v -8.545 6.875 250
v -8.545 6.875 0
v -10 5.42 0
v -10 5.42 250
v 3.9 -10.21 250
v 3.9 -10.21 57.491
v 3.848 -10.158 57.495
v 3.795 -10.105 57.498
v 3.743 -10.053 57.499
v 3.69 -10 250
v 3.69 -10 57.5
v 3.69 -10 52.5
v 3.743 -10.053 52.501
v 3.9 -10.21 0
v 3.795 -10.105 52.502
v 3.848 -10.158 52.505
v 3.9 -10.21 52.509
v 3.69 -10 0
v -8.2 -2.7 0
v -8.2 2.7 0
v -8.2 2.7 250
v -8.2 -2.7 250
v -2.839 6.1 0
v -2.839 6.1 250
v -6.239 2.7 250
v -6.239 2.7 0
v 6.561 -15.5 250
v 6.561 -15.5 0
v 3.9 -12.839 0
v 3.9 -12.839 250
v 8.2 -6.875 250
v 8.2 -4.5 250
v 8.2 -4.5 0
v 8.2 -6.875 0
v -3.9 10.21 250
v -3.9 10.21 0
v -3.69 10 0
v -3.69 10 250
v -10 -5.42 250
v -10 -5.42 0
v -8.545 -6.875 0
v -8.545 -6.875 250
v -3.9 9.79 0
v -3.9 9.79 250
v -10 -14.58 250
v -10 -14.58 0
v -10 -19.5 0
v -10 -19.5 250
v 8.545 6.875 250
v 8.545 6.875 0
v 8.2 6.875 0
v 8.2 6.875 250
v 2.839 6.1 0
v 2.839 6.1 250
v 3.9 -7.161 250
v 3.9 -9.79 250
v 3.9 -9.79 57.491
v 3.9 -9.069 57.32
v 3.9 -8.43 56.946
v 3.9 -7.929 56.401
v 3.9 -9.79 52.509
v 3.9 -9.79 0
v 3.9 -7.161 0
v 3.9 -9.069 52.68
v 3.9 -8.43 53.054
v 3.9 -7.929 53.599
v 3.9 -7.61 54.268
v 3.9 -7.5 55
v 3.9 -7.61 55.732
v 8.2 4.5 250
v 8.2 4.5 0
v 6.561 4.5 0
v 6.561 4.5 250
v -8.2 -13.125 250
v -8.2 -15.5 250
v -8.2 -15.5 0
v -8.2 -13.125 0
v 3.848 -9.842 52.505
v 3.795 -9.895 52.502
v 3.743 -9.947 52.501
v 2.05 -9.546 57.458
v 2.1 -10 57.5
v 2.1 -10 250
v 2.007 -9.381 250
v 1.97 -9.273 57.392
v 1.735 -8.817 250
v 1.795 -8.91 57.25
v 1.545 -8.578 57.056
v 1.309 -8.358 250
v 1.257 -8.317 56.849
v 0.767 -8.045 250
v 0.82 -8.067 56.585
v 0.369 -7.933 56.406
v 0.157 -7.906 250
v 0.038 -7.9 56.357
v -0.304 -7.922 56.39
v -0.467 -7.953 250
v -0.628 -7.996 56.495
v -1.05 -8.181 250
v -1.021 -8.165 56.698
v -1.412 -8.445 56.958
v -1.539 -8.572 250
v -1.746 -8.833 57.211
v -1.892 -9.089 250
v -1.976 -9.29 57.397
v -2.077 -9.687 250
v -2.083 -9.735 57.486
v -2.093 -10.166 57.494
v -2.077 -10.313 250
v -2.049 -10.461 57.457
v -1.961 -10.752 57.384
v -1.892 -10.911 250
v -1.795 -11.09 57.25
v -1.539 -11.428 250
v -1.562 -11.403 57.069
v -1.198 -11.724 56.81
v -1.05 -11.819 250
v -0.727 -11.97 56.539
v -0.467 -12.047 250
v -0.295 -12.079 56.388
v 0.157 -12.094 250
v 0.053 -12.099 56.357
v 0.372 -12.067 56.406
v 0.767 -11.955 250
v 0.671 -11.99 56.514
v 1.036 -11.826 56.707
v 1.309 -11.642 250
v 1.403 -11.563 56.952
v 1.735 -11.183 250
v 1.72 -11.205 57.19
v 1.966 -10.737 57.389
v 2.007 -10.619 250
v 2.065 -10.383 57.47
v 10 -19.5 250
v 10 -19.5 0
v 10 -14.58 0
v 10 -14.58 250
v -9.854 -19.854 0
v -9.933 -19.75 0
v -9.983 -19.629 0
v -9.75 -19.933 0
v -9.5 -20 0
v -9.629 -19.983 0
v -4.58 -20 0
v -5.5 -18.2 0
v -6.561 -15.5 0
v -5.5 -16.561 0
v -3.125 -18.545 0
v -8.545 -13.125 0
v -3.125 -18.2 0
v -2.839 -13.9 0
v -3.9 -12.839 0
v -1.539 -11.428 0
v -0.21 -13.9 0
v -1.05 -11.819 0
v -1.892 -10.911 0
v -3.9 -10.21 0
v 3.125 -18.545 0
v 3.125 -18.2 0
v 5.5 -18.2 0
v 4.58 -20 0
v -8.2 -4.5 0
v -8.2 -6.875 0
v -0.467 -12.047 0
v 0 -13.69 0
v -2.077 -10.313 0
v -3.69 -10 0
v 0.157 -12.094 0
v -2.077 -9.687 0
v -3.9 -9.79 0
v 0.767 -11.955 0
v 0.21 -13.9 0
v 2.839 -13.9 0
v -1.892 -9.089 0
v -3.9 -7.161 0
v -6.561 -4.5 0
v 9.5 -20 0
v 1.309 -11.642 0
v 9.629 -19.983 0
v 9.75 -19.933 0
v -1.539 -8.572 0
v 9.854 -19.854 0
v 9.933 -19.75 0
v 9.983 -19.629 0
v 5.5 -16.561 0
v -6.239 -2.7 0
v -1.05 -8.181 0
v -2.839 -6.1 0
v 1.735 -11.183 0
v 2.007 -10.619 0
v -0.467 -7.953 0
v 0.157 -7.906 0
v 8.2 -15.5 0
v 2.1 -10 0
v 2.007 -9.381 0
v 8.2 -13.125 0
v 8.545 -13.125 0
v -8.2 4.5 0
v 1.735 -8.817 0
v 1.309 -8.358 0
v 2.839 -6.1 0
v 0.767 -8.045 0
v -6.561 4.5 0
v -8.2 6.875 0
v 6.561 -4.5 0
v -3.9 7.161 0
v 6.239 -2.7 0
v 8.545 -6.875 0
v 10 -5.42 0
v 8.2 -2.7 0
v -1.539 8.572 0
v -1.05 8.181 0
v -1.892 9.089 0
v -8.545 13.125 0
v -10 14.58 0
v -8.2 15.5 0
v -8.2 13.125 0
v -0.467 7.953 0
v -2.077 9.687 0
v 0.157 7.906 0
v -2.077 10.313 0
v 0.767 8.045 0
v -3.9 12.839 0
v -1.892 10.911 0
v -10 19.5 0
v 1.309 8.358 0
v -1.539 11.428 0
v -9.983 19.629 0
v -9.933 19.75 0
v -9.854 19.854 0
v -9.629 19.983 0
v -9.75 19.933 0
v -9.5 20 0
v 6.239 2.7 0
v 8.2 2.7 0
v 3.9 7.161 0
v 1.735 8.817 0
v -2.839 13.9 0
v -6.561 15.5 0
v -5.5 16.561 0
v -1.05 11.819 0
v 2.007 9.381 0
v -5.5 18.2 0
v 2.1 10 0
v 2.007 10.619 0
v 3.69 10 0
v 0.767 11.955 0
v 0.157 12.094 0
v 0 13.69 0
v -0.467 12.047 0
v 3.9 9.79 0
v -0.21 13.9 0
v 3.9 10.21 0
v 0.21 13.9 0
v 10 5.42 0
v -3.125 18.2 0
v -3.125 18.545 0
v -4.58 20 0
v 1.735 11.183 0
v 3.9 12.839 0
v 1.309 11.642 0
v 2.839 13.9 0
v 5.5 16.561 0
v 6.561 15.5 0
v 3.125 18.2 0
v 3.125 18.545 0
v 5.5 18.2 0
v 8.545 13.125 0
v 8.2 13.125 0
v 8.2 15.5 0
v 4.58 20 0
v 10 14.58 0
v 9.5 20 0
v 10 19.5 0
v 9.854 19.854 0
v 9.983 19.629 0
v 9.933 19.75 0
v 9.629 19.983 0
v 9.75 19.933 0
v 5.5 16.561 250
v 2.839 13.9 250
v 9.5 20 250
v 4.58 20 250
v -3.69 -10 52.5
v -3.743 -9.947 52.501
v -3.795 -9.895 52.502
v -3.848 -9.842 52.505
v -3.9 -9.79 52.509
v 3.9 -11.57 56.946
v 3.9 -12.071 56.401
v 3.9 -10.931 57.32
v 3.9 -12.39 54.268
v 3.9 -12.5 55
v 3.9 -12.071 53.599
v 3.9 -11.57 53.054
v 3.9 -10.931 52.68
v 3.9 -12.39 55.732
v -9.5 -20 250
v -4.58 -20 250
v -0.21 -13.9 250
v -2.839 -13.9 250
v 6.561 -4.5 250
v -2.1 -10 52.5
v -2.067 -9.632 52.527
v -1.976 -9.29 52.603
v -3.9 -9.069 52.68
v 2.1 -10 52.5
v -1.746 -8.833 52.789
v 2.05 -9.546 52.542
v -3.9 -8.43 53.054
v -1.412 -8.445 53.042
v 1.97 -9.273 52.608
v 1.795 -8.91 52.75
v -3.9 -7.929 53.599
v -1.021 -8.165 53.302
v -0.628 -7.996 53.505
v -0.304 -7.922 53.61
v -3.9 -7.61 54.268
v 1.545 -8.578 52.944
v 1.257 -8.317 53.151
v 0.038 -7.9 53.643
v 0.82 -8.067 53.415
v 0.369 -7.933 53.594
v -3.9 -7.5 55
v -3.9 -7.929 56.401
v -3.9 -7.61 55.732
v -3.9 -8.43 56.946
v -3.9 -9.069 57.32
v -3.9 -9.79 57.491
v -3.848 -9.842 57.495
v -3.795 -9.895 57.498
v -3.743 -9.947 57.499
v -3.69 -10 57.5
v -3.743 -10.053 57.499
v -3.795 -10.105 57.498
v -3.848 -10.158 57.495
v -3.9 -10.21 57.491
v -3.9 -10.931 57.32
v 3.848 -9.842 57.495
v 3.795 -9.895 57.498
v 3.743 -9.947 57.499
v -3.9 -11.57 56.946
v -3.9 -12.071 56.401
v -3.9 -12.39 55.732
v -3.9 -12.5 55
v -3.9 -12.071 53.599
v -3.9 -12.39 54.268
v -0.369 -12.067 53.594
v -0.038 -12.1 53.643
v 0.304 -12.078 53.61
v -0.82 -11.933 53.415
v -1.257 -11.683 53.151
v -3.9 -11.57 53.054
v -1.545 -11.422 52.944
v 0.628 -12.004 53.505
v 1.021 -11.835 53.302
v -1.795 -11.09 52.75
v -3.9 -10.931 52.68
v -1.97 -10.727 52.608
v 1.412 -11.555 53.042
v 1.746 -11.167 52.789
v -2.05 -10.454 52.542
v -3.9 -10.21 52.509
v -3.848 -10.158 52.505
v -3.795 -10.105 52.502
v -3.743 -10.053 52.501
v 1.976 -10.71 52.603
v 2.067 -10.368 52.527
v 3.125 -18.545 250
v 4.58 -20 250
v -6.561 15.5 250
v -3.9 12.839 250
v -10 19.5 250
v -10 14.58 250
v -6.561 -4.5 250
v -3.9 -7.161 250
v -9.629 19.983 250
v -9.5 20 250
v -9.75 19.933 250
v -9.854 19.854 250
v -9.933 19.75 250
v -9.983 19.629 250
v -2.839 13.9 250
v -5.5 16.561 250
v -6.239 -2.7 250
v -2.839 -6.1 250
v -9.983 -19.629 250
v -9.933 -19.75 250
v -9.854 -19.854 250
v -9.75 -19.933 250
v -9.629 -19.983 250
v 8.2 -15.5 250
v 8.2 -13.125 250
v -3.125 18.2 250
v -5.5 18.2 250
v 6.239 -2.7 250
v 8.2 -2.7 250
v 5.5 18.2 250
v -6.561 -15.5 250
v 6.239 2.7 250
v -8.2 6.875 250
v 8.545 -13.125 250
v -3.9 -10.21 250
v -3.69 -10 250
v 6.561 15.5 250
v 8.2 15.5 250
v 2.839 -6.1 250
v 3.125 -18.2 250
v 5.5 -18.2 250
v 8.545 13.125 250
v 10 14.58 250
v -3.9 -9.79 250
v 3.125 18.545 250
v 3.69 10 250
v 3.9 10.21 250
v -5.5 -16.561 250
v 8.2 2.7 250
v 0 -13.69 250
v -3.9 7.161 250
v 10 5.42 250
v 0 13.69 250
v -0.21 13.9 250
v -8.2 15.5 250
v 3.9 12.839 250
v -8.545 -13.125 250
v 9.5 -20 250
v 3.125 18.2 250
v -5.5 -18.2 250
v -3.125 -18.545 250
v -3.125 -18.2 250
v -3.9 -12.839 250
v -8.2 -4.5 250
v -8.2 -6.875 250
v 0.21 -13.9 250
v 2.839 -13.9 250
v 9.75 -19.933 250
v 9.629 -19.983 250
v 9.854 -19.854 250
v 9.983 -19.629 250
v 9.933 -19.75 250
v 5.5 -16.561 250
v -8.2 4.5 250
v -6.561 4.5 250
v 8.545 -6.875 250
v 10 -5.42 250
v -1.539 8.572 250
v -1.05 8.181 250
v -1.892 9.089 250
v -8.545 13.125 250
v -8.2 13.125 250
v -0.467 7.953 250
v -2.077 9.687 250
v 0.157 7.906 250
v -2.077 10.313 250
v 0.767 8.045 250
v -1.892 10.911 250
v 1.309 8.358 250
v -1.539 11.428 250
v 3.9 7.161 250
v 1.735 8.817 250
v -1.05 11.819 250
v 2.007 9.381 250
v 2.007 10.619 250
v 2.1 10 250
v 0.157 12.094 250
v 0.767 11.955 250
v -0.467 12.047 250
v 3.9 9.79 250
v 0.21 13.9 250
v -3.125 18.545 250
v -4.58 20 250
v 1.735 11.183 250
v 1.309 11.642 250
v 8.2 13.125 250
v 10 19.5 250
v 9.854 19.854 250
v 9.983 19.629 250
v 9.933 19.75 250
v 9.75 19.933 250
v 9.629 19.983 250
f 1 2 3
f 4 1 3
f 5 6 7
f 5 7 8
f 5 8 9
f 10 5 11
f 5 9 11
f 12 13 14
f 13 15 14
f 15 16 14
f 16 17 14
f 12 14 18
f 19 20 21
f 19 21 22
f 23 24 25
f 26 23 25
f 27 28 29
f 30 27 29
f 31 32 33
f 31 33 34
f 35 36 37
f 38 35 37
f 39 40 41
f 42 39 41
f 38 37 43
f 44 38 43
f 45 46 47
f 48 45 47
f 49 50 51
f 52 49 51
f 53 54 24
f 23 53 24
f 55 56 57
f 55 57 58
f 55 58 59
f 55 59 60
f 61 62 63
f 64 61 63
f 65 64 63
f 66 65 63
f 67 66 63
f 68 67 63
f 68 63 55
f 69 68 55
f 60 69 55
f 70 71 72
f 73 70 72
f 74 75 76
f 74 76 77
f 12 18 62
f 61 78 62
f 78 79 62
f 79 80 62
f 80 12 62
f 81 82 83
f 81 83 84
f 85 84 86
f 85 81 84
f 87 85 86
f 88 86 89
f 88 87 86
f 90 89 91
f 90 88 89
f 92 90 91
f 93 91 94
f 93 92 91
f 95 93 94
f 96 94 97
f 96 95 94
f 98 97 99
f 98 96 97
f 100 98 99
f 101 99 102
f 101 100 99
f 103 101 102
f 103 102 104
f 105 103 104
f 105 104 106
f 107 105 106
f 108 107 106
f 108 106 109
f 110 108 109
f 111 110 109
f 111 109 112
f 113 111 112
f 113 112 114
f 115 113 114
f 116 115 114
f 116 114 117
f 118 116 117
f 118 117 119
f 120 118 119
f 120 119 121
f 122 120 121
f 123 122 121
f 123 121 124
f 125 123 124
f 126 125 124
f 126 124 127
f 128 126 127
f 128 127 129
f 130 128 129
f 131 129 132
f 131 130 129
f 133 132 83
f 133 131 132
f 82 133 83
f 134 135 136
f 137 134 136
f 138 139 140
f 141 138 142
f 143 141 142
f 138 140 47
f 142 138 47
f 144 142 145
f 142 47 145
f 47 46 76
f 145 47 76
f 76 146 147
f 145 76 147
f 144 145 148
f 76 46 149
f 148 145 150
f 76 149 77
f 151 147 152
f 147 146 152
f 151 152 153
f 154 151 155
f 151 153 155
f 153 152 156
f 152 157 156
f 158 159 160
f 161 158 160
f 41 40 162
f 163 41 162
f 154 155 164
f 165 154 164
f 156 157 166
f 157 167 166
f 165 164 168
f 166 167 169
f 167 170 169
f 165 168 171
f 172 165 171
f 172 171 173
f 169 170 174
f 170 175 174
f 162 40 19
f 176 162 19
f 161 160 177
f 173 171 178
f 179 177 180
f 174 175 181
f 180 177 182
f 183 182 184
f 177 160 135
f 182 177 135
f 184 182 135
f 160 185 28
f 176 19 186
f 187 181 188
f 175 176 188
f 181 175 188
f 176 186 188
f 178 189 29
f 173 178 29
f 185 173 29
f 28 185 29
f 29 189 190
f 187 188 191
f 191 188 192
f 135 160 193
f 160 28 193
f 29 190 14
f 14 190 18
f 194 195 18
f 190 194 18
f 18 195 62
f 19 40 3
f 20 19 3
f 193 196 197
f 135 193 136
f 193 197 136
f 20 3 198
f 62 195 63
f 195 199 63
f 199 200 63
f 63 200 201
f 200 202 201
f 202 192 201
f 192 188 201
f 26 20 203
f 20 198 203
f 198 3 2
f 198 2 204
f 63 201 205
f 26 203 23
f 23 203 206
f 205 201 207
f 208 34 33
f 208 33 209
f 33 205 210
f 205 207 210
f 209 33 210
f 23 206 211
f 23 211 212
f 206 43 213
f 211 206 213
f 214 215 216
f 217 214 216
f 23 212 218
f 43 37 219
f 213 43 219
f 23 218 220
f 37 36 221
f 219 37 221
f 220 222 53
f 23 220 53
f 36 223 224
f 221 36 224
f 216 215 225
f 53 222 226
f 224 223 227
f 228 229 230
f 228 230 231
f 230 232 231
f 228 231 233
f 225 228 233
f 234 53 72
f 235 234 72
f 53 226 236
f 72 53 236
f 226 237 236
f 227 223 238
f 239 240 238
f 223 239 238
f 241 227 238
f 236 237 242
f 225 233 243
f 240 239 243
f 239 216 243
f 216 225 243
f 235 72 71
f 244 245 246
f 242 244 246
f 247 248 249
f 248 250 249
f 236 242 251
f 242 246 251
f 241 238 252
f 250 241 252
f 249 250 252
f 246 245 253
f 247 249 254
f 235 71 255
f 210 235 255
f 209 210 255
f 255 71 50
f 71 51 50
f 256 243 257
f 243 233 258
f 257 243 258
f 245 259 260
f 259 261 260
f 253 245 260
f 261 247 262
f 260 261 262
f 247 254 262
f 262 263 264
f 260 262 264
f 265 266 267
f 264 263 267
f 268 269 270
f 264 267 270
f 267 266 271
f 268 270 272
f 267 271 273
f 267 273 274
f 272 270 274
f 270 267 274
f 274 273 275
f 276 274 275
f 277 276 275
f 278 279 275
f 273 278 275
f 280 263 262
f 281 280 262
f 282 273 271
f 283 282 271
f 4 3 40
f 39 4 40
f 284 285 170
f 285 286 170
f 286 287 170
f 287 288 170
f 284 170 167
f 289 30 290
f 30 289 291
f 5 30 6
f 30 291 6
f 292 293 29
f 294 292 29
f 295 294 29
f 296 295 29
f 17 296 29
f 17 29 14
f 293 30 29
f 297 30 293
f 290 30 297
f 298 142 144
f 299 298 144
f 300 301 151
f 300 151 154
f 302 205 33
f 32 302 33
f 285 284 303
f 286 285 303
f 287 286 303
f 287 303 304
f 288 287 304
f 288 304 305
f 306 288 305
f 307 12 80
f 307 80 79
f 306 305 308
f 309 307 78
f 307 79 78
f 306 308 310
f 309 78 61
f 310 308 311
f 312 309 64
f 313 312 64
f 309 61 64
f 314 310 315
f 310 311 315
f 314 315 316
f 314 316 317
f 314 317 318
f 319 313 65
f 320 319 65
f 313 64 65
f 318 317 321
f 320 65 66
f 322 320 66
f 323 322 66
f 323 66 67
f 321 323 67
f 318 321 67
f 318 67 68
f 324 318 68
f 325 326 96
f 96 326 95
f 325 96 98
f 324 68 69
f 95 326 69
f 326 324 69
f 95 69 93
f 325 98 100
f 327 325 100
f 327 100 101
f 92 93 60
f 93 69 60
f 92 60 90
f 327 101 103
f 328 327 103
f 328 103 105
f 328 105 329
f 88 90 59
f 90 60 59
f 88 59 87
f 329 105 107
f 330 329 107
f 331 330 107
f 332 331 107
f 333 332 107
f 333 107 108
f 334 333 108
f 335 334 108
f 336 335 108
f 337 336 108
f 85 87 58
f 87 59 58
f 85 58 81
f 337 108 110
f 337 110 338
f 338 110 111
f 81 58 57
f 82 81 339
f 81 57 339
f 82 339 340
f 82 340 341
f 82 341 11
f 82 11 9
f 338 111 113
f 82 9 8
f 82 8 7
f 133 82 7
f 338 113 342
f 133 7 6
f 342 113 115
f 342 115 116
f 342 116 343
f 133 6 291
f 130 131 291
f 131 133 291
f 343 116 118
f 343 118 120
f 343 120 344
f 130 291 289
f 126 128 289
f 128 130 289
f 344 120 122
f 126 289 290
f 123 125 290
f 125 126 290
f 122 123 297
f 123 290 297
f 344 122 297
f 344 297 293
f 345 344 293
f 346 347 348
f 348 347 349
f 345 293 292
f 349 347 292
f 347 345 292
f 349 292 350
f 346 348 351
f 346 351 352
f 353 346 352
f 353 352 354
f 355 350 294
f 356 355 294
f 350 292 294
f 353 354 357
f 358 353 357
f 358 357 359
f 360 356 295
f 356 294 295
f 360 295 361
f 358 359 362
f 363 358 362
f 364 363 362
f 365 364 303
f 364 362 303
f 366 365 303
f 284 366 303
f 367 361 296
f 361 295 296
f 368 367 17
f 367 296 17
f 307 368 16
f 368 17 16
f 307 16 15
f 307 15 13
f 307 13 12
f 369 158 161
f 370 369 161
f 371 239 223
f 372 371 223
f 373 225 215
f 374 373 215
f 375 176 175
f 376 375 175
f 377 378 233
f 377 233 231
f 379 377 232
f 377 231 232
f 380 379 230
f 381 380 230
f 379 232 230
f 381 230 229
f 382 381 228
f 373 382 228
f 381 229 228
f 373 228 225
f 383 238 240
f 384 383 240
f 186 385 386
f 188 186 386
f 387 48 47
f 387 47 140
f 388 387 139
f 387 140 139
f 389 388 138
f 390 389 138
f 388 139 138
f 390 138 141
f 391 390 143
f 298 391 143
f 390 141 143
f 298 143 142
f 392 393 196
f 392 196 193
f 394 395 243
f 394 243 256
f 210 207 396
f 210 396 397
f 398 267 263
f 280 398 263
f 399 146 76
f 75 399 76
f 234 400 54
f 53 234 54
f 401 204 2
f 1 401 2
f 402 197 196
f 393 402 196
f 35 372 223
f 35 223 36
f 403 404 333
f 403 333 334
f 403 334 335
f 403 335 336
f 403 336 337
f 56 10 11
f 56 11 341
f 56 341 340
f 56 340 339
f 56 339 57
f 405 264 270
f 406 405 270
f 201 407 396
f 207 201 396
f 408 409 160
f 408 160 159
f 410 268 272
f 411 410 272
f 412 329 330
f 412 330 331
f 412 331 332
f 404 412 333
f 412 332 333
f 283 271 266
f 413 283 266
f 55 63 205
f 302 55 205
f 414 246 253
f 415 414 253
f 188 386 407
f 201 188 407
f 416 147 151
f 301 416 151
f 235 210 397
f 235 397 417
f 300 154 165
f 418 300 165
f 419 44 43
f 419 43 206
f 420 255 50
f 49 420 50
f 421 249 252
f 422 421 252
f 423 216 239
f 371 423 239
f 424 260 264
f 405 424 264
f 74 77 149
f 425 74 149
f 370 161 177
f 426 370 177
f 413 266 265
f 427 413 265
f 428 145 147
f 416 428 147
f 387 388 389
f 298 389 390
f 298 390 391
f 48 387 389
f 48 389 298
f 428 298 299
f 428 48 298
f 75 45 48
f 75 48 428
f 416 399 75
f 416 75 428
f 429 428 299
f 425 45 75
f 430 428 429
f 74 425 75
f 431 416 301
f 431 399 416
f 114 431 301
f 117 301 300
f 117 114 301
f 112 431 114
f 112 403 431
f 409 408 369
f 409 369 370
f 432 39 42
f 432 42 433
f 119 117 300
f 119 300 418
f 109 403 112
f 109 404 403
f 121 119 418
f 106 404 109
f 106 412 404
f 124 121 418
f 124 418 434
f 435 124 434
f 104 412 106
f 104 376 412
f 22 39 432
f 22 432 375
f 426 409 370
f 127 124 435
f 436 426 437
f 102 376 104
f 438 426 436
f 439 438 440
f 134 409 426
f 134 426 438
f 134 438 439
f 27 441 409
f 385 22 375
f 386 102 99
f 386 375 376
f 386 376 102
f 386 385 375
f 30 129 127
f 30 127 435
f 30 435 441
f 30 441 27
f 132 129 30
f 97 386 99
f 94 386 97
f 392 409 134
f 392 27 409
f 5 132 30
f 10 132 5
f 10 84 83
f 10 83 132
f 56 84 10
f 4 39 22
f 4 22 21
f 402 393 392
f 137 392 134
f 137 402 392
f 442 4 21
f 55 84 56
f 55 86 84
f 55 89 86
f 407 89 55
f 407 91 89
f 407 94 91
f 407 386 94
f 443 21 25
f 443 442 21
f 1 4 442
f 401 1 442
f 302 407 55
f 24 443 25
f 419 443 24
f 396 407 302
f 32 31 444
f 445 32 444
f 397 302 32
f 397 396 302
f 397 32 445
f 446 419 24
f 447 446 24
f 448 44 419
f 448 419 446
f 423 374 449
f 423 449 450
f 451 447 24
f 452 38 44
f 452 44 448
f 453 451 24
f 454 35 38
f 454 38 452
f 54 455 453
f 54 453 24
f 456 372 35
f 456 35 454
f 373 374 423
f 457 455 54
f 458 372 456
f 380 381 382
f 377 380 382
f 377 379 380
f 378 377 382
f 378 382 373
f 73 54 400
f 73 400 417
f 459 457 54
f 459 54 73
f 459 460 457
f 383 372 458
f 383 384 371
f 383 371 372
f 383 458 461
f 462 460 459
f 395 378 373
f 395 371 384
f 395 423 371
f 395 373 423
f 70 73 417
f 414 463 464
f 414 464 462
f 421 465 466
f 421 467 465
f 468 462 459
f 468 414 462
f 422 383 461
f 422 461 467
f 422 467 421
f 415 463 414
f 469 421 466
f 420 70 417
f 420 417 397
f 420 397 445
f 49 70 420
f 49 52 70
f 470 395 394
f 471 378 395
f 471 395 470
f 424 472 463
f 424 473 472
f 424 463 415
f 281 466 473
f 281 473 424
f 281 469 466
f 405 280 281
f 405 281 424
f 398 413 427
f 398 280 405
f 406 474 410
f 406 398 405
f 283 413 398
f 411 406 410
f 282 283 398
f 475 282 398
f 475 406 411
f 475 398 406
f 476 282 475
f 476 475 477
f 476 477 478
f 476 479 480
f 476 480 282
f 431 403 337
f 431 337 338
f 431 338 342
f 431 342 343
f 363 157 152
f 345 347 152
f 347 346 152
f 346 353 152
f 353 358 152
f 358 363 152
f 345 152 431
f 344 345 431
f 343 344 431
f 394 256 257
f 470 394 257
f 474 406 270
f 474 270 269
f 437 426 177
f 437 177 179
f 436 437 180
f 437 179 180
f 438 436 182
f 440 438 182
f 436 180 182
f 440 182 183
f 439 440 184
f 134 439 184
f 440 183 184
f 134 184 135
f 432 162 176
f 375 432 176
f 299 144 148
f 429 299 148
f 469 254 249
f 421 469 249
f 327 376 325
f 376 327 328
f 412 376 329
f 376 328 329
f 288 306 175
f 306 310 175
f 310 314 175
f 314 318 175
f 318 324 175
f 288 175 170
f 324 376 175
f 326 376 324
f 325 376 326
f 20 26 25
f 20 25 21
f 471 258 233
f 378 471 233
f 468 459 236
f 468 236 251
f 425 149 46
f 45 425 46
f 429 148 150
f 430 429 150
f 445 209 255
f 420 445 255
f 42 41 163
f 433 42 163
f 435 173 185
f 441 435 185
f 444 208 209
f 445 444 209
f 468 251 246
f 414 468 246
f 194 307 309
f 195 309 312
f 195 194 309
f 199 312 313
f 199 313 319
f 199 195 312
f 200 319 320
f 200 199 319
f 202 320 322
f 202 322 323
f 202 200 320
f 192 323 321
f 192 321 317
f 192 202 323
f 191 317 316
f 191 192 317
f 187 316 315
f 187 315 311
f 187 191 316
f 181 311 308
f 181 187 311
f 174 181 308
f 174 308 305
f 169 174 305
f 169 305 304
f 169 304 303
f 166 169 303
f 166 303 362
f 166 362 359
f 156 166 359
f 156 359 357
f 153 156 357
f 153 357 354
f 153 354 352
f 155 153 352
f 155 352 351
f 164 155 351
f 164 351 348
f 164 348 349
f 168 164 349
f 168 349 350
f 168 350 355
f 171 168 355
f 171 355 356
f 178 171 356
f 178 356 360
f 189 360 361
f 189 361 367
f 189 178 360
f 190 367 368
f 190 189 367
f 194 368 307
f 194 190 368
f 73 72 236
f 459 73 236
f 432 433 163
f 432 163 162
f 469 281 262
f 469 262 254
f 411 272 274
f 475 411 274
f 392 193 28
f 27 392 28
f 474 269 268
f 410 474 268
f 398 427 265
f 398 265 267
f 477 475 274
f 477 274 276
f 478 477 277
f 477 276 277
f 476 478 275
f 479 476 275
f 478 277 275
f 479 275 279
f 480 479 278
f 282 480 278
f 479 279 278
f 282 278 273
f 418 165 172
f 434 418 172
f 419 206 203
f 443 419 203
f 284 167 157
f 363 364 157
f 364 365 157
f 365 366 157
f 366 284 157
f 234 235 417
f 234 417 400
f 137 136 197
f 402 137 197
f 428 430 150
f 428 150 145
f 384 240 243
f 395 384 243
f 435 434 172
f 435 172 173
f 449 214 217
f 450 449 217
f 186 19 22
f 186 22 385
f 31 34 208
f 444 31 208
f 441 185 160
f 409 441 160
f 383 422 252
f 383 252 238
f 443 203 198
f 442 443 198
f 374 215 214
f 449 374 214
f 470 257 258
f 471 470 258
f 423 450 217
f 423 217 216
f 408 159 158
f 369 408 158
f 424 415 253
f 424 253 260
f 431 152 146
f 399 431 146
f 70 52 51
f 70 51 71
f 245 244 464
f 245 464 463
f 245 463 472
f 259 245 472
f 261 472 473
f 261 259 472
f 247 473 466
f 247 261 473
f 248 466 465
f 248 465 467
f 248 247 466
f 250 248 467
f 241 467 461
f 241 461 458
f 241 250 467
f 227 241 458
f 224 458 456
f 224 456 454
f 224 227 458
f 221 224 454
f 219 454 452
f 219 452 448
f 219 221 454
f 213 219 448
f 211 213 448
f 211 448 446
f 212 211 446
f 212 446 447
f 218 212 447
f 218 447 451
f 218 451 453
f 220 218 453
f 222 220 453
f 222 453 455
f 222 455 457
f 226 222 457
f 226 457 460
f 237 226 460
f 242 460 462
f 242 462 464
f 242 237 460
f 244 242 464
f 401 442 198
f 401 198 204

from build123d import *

# Parameters (mm, degrees)
ESBO_O1_R                = 2.1
RESSALTO_EXTRUS_O1_DEPTH = 250
CORTE_EXTRUS_O1_REACH    = 253.595
ESBO_O2_R                = 2.5


with BuildPart() as part:
    # Esboço1 → Ressalto-extrusão1 (new body)
    with BuildSketch(Plane.XY):
        with BuildLine():
            Line((3.9, 9.79), (3.69, 10))
            Line((3.69, 10), (3.9, 10.21))
            Line((3.9, 10.21), (3.9, 12.839339828))
            Line((3.9, 12.839339828), (6.560660172, 15.5))
            Line((6.560660172, 15.5), (8.2, 15.5))
            Line((8.2, 15.5), (8.2, 13.125))
            Line((8.2, 13.125), (8.545, 13.125))
            Line((8.545, 13.125), (10, 14.58))
            Line((10, 14.58), (10, 19.5))
            ThreePointArc((10, 19.5), (9.853553391, 19.853553391), (9.5, 20))
            Line((9.5, 20), (4.58, 20))
            Line((4.58, 20), (3.125, 18.545))
            Line((3.125, 18.545), (3.125, 18.2))
            Line((3.125, 18.2), (5.5, 18.2))
            Line((5.5, 18.2), (5.5, 16.560660172))
            Line((5.5, 16.560660172), (2.839339828, 13.9))
            Line((2.839339828, 13.9), (0.21, 13.9))
            Line((0.21, 13.9), (0, 13.69))
            Line((0, 13.69), (-0.21, 13.9))
            Line((-0.21, 13.9), (-2.839339828, 13.9))
            Line((-2.839339828, 13.9), (-5.5, 16.560660172))
            Line((-5.5, 16.560660172), (-5.5, 18.2))
            Line((-5.5, 18.2), (-3.125, 18.2))
            Line((-3.125, 18.2), (-3.125, 18.545))
            Line((-3.125, 18.545), (-4.58, 20))
            Line((-4.58, 20), (-9.5, 20))
            ThreePointArc((-9.5, 20), (-9.853553391, 19.853553391), (-10, 19.5))
            Line((-10, 19.5), (-10, 14.58))
            Line((-10, 14.58), (-8.545, 13.125))
            Line((-8.545, 13.125), (-8.2, 13.125))
            Line((-8.2, 13.125), (-8.2, 15.5))
            Line((-8.2, 15.5), (-6.560660172, 15.5))
            Line((-6.560660172, 15.5), (-3.9, 12.839339828))
            Line((-3.9, 12.839339828), (-3.9, 10.21))
            Line((-3.9, 10.21), (-3.69, 10))
            Line((-3.69, 10), (-3.9, 9.79))
            Line((-3.9, 9.79), (-3.9, 7.160660172))
            Line((-3.9, 7.160660172), (-6.560660172, 4.5))
            Line((-6.560660172, 4.5), (-8.2, 4.5))
            Line((-8.2, 4.5), (-8.2, 6.875))
            Line((-8.2, 6.875), (-8.545, 6.875))
            Line((-8.545, 6.875), (-10, 5.42))
            Line((-10, 5.42), (-10, -5.42))
            Line((-10, -5.42), (-8.545, -6.875))
            Line((-8.545, -6.875), (-8.2, -6.875))
            Line((-8.2, -6.875), (-8.2, -4.5))
            Line((-8.2, -4.5), (-6.560660172, -4.5))
            Line((-6.560660172, -4.5), (-3.9, -7.160660172))
            Line((-3.9, -7.160660172), (-3.9, -9.79))
            Line((-3.9, -9.79), (-3.69, -10))
            Line((-3.69, -10), (-3.9, -10.21))
            Line((-3.9, -10.21), (-3.9, -12.839339828))
            Line((-3.9, -12.839339828), (-6.560660172, -15.5))
            Line((-6.560660172, -15.5), (-8.2, -15.5))
            Line((-8.2, -15.5), (-8.2, -13.125))
            Line((-8.2, -13.125), (-8.545, -13.125))
            Line((-8.545, -13.125), (-10, -14.58))
            Line((-10, -14.58), (-10, -19.5))
            ThreePointArc((-10, -19.5), (-9.853553391, -19.853553391), (-9.5, -20))
            Line((-9.5, -20), (-4.58, -20))
            Line((-4.58, -20), (-3.125, -18.545))
            Line((-3.125, -18.545), (-3.125, -18.2))
            Line((-3.125, -18.2), (-5.5, -18.2))
            Line((-5.5, -18.2), (-5.5, -16.560660172))
            Line((-5.5, -16.560660172), (-2.839339828, -13.9))
            Line((-2.839339828, -13.9), (-0.21, -13.9))
            Line((-0.21, -13.9), (0, -13.69))
            Line((0, -13.69), (0.21, -13.9))
            Line((0.21, -13.9), (2.839339828, -13.9))
            Line((2.839339828, -13.9), (5.5, -16.560660172))
            Line((5.5, -16.560660172), (5.5, -18.2))
            Line((5.5, -18.2), (3.125, -18.2))
            Line((3.125, -18.2), (3.125, -18.545))
            Line((3.125, -18.545), (4.58, -20))
            Line((4.58, -20), (9.5, -20))
            ThreePointArc((9.5, -20), (9.853553391, -19.853553391), (10, -19.5))
            Line((10, -19.5), (10, -14.58))
            Line((10, -14.58), (8.545, -13.125))
            Line((8.545, -13.125), (8.2, -13.125))
            Line((8.2, -13.125), (8.2, -15.5))
            Line((8.2, -15.5), (6.560660172, -15.5))
            Line((6.560660172, -15.5), (3.9, -12.839339828))
            Line((3.9, -12.839339828), (3.9, -10.21))
            Line((3.9, -10.21), (3.69, -10))
            Line((3.69, -10), (3.9, -9.79))
            Line((3.9, -9.79), (3.9, -7.160660172))
            Line((3.9, -7.160660172), (6.560660172, -4.5))
            Line((6.560660172, -4.5), (8.2, -4.5))
            Line((8.2, -4.5), (8.2, -6.875))
            Line((8.2, -6.875), (8.545, -6.875))
            Line((8.545, -6.875), (10, -5.42))
            Line((10, -5.42), (10, 5.42))
            Line((10, 5.42), (8.545, 6.875))
            Line((8.545, 6.875), (8.2, 6.875))
            Line((8.2, 6.875), (8.2, 4.5))
            Line((8.2, 4.5), (6.560660172, 4.5))
            Line((6.560660172, 4.5), (3.9, 7.160660172))
            Line((3.9, 7.160660172), (3.9, 9.79))
        make_face()
        with Locations((0, -10)):
            Circle(ESBO_O1_R, mode=Mode.SUBTRACT)
        with Locations((0, 10)):
            Circle(ESBO_O1_R, mode=Mode.SUBTRACT)
        Polygon((8.2, -2.7), (8.2, 2.7), (6.239339828, 2.7), (2.839339828, 6.1), (-2.839339828, 6.1), (-6.239339828, 2.7), (-8.2, 2.7), (-8.2, -2.7), (-6.239339828, -2.7), (-2.839339828, -6.1), (2.839339828, -6.1), (6.239339828, -2.7), align=None, mode=Mode.SUBTRACT)
    extrude(amount=RESSALTO_EXTRUS_O1_DEPTH)

    # Corte-extrusão1: up to this face of the body (flat: up to its plane)
    corte_extrus_o1_end = Plane(part.part.faces().sort_by_distance((-10, 0, 125))[0])
    # Esboço2 → Corte-extrusão1 (cut, up to the picked face)
    with BuildSketch(Plane(origin=(10, 0, 0), x_dir=(0, 0, -1), z_dir=(1, 0, 0)), mode=Mode.PRIVATE) as corte_extrus_o1_sk1:
        with Locations((-55, -10)):
            Circle(ESBO_O2_R)
    corte_extrus_o1_tool1 = split(extrude(corte_extrus_o1_sk1.sketch, amount=-CORTE_EXTRUS_O1_REACH, mode=Mode.PRIVATE), bisect_by=corte_extrus_o1_end, keep=Keep.BOTH, mode=Mode.PRIVATE)
    add(corte_extrus_o1_tool1.solids().sort_by(Axis((10, -10, 55), (-1, 0, 0)))[0], mode=Mode.SUBTRACT)


solid = part.part
